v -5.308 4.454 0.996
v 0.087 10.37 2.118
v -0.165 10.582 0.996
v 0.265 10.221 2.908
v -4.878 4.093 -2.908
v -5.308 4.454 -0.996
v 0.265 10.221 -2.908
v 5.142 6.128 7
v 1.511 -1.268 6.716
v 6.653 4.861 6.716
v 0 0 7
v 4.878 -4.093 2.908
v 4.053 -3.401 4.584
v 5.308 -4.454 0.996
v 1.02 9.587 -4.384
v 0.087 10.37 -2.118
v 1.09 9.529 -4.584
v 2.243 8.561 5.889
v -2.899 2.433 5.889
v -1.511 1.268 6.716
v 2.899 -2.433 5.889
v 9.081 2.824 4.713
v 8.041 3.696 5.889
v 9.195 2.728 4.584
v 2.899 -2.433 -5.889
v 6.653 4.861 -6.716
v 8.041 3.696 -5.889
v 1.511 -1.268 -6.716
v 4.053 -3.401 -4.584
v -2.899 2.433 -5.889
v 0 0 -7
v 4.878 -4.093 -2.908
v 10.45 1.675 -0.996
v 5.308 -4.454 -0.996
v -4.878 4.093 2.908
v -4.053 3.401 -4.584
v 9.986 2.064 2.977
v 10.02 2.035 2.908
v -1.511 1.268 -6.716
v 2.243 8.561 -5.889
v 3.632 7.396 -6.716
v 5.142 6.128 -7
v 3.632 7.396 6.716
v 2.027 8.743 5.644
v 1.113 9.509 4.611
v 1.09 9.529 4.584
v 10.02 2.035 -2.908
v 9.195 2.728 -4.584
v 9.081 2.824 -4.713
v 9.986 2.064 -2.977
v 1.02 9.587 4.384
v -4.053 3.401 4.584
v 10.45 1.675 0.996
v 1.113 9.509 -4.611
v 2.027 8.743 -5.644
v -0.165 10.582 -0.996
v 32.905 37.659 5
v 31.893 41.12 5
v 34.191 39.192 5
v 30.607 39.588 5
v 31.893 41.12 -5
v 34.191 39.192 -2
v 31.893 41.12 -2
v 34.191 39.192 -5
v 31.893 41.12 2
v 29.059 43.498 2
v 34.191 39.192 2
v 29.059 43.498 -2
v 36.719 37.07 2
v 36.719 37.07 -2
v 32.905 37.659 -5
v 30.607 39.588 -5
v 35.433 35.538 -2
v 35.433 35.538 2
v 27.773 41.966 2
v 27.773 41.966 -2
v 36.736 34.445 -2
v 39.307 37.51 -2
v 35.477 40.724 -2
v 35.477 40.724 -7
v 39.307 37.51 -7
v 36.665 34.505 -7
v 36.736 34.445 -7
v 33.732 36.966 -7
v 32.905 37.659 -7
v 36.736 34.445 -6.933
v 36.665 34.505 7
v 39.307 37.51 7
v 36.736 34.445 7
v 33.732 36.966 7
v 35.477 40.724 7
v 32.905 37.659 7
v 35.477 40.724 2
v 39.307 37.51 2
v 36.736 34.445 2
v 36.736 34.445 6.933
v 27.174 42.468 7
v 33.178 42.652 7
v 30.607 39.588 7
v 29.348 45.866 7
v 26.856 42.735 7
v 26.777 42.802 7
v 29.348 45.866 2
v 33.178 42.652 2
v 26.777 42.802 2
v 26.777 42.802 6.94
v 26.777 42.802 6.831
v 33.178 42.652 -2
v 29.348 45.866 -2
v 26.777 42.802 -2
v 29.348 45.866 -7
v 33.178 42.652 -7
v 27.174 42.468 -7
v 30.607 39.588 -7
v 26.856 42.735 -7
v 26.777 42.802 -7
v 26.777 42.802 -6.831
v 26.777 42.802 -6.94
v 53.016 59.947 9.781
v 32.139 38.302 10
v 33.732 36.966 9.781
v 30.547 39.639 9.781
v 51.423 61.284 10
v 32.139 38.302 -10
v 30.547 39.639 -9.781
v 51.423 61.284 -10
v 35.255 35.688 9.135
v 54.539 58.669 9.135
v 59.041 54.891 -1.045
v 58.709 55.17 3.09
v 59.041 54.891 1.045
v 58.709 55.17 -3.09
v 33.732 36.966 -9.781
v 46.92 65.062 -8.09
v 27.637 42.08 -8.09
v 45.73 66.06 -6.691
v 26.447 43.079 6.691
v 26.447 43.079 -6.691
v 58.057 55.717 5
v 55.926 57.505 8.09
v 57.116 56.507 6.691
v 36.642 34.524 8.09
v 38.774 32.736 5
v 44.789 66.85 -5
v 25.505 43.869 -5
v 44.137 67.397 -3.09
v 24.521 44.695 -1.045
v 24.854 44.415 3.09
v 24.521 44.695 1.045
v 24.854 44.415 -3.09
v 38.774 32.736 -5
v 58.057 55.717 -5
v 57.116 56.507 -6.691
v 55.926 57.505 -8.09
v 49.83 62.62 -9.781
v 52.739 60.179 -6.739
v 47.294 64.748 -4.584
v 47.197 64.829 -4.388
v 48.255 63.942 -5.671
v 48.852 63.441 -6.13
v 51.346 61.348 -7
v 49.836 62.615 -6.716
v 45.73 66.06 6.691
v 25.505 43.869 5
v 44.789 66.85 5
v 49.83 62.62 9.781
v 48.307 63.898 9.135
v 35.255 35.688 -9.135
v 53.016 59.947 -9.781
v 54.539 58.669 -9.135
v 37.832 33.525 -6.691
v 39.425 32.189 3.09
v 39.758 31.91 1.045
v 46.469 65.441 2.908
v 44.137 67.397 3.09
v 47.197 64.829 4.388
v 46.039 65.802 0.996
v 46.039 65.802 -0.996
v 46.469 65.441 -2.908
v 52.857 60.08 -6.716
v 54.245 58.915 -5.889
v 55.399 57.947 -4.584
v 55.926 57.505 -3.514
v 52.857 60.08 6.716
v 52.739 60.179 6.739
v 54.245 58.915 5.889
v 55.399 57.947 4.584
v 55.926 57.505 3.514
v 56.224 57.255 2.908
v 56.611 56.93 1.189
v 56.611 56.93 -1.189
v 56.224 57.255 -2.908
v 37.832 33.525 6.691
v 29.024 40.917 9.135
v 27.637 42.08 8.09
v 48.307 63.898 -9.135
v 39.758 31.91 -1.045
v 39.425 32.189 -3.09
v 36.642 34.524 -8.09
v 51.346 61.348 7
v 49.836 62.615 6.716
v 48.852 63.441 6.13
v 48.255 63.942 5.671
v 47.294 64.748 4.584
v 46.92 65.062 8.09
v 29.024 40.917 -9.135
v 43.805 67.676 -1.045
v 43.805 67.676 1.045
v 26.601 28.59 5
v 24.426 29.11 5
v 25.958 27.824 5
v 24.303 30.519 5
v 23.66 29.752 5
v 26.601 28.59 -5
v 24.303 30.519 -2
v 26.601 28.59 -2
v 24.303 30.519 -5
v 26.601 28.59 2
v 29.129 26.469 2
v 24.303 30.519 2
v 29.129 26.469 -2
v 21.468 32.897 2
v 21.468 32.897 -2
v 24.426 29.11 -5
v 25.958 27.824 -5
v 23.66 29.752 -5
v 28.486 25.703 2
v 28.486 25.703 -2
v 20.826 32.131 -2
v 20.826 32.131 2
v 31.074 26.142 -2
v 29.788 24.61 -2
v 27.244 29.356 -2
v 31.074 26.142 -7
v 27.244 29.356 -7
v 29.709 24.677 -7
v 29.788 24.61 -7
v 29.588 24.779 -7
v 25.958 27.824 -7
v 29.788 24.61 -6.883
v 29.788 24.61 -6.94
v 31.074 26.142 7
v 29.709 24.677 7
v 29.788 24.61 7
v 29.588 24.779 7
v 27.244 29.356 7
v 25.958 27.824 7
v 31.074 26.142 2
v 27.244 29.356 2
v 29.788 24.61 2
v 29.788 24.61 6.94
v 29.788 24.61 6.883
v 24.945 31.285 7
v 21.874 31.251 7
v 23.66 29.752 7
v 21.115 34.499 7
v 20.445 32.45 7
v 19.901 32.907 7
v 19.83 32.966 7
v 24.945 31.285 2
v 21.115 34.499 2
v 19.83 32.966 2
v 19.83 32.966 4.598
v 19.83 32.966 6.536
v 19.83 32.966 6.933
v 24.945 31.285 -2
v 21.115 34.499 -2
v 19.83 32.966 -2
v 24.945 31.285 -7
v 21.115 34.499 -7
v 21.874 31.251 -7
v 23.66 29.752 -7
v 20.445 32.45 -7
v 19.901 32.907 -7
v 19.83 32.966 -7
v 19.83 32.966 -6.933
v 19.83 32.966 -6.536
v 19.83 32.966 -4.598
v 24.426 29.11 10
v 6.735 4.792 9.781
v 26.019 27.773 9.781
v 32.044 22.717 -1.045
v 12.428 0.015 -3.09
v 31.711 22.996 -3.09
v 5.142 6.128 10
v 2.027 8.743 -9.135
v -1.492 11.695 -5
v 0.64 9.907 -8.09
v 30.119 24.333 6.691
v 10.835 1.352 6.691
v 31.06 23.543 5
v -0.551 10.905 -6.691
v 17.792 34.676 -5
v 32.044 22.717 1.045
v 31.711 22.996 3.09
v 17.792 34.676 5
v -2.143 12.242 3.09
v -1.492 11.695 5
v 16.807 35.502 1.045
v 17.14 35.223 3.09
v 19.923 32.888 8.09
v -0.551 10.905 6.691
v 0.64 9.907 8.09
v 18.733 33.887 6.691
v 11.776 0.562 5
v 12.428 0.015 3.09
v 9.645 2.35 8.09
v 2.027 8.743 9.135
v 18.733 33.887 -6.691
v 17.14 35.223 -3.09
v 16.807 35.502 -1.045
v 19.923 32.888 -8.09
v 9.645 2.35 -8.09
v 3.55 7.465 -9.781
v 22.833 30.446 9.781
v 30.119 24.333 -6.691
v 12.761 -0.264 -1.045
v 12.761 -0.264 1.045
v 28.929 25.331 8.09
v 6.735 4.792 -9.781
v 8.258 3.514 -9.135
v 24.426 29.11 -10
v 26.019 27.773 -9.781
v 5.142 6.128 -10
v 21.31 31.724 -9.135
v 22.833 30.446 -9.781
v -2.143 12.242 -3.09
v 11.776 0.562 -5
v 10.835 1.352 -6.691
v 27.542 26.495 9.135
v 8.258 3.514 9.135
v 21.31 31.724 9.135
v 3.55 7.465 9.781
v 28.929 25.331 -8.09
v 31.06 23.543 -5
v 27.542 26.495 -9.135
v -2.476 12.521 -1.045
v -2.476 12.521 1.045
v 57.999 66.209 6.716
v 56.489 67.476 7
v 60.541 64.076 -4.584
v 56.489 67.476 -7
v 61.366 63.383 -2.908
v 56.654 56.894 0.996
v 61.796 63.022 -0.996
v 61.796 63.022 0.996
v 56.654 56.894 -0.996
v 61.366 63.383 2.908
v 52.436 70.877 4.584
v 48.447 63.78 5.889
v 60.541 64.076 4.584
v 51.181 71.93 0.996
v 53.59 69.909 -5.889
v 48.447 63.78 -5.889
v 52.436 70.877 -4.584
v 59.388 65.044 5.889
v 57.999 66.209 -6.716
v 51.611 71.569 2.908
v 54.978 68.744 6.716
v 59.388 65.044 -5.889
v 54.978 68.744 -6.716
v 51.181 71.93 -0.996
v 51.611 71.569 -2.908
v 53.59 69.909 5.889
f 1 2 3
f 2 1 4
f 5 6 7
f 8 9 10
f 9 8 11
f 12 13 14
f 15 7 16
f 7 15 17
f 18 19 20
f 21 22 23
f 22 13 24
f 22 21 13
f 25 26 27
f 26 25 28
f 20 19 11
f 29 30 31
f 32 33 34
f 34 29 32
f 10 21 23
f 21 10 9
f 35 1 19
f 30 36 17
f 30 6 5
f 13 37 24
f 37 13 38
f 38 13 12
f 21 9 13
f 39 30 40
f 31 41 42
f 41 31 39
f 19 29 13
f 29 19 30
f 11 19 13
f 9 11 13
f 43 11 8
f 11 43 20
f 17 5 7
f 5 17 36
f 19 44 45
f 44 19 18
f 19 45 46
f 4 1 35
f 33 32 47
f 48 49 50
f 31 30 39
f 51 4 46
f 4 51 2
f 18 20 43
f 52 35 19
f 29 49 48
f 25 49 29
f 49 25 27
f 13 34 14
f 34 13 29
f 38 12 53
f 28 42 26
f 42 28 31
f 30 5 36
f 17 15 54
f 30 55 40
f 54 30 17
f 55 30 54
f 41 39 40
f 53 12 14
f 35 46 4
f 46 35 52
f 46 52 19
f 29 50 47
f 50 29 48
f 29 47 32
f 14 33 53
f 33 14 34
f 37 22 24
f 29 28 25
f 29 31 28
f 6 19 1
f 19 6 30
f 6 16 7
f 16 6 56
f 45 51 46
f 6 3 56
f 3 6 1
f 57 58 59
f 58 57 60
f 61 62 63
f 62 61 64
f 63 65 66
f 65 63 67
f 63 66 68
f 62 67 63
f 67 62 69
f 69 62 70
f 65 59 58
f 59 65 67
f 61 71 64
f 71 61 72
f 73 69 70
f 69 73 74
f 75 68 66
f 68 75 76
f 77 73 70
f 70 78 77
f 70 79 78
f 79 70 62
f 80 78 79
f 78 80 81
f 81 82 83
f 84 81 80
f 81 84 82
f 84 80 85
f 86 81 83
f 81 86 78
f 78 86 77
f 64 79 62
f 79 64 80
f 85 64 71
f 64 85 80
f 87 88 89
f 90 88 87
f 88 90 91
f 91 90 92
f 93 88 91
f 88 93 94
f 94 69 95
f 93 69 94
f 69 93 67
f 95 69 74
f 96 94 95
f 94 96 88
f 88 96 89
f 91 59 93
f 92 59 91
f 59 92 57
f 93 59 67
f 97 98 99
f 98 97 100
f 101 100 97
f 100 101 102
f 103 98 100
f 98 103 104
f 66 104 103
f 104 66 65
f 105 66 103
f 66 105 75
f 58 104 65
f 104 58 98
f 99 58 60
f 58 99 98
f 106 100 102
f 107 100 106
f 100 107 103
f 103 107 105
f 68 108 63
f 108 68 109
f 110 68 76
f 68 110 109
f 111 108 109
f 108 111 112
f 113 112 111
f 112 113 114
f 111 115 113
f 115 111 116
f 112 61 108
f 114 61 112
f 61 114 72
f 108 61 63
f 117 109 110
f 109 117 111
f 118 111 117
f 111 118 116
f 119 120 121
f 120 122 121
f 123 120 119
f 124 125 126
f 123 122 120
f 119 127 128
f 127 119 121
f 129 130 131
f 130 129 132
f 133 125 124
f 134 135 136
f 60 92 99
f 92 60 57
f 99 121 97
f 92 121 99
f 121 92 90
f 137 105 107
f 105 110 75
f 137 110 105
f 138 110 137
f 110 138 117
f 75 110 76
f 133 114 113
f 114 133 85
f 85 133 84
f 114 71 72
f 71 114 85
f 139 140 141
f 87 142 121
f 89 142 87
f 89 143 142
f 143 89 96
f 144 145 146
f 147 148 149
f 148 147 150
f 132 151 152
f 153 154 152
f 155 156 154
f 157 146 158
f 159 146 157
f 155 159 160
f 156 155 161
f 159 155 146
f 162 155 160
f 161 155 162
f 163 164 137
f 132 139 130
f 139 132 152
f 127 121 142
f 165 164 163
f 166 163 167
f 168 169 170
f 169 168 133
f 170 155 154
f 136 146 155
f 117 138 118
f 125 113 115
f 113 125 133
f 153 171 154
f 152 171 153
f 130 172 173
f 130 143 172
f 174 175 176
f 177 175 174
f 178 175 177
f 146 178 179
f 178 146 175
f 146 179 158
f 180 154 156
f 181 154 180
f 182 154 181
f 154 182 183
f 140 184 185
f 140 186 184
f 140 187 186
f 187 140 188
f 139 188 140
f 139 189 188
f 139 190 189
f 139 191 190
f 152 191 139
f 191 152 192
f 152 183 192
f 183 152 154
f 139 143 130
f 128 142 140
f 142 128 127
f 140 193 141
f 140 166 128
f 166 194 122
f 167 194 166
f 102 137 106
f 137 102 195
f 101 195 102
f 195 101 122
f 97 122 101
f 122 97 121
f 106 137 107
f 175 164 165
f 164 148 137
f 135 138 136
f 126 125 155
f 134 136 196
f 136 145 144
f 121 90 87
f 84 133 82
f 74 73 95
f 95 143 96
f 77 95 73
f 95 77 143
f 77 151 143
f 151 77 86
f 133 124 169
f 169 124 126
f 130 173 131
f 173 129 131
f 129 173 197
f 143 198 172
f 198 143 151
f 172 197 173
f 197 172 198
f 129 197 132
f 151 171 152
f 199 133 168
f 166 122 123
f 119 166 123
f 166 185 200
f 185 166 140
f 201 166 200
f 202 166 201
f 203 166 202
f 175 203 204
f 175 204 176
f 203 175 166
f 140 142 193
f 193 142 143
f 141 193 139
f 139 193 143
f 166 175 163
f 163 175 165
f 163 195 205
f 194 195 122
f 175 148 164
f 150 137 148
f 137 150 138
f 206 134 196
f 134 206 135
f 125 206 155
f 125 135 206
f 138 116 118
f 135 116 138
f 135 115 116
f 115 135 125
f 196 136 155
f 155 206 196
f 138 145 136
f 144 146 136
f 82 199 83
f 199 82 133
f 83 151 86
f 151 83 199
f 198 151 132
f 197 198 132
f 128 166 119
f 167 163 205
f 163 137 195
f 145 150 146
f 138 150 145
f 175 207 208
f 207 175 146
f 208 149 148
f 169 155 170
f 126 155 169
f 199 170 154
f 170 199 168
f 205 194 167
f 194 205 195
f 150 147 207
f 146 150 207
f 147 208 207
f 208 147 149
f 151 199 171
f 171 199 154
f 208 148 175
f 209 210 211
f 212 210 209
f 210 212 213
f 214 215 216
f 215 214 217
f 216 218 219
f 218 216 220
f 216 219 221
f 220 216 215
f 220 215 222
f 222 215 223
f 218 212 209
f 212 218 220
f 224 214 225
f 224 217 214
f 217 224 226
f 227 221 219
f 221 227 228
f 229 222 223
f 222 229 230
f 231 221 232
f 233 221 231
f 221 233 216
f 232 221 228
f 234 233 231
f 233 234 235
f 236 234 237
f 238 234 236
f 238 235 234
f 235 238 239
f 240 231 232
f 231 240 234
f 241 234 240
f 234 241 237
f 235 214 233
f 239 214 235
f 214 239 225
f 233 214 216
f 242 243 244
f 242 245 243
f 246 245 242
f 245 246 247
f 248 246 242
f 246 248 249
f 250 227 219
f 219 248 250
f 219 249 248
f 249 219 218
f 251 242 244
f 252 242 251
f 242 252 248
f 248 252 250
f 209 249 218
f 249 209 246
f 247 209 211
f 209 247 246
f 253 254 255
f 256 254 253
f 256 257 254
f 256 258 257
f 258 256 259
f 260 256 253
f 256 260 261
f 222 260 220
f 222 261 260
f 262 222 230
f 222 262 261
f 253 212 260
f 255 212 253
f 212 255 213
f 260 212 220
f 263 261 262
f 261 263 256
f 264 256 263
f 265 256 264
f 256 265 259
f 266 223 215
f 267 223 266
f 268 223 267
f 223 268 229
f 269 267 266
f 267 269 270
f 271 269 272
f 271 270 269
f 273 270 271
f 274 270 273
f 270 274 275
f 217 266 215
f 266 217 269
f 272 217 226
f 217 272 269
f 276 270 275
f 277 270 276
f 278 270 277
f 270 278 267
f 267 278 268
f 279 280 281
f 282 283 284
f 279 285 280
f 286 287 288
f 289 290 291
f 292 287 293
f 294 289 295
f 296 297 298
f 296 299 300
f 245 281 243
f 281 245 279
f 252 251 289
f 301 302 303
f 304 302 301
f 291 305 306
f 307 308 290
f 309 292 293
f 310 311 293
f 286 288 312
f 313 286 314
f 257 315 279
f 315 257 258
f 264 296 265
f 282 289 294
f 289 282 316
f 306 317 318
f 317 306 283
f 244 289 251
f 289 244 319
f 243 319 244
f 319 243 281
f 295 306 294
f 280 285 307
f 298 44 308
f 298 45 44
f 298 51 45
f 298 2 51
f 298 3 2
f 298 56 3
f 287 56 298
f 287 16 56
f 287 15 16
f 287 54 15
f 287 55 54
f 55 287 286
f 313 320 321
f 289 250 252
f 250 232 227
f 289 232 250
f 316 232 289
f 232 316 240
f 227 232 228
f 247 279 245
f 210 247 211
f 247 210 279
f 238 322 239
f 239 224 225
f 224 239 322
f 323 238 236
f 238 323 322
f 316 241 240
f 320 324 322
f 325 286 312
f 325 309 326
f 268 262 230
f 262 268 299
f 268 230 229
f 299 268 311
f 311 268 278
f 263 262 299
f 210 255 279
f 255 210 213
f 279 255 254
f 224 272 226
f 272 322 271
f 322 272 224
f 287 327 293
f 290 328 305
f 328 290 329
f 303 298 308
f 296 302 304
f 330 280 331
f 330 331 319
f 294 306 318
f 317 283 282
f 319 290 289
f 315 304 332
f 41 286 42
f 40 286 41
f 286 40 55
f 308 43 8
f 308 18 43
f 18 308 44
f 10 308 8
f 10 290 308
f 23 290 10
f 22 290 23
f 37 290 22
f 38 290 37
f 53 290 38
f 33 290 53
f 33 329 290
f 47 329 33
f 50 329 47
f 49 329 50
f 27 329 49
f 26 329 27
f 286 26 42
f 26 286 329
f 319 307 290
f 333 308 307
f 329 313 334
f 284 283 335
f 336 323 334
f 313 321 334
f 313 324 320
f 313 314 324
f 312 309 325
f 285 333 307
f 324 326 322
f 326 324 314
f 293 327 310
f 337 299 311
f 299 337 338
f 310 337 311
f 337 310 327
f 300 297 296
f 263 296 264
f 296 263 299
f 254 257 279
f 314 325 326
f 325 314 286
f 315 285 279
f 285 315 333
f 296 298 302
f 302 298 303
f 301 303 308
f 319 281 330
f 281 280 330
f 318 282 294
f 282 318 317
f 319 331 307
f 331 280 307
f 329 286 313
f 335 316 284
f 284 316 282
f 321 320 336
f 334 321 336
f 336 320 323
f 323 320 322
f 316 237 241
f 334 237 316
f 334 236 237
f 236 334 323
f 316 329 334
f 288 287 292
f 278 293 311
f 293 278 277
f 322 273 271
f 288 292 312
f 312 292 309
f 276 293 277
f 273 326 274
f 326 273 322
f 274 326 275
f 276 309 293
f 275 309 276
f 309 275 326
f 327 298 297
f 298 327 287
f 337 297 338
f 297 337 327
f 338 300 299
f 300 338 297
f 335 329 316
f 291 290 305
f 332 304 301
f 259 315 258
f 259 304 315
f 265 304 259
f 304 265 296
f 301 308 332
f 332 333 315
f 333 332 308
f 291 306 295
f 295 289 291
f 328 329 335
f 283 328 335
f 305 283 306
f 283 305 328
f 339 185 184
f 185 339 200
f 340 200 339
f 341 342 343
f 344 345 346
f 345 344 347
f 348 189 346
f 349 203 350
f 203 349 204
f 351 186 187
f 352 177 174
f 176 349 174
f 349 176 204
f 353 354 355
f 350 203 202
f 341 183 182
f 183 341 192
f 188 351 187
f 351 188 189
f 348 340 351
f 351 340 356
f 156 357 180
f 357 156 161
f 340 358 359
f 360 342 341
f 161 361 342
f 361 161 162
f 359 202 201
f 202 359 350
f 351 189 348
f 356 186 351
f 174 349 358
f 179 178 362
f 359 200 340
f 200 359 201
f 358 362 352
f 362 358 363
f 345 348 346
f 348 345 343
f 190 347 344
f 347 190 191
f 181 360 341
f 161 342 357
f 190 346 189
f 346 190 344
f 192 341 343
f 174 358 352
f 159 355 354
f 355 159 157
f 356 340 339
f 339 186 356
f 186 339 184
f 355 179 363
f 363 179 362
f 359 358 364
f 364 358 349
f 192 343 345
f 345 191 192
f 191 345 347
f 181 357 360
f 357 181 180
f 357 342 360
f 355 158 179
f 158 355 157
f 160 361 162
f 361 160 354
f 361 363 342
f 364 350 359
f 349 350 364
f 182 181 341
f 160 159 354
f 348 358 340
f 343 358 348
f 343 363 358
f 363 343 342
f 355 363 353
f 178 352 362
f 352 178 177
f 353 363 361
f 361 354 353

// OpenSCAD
w = 3;
d = 30;
h = 1;

difference(){
rotate([0,-90,-130])
    color("grey")
    cylinder(8,7,7);

translate([+2,+3,+2])
    #color("grey")
    cylinder(2,2,2);
}

rotate([0,-90,-130])
translate([0,0,+8])
    #color("grey")
    cylinder(30,10,10);

rotate([0,-90,-130])
    #color("grey")
    cylinder(8,7,4);

difference(){
rotate([0,-90,-130])
translate([0,-0,+50])
    #color("grey")
    cylinder(30,10,10);

rotate([0,-90,-130])color("grey"){
translate([-5,-26,+50]){
translate([0,20.3,-1])cube([10,10,3]);
translate([-2,27,-1])cube(5,5,5);

translate([+7,27,-1])cube([5,5,5]);
translate([+7,19,-1])cube([5,5,5]);
translate([-2,19,-1])cube([5,5,5]);
}
}
}

rotate([0,-90,-130])
translate([0,-0.1,+80])
    color("grey")
    cylinder(8,7,7);

difference(){
difference(){
rotate([0,-90,-130])color("grey"){
translate([-5,-25,36]){
translate([0,20.3,0])cube([10,10,3]);
translate([-2,27,-1])cube(5,5,5);

translate([+7,27,-1])cube([5,5,5]);
translate([+7,19,-1])cube([5,5,5]);
translate([-2,19,-1])cube([5,5,5]);
}
}
}
}
